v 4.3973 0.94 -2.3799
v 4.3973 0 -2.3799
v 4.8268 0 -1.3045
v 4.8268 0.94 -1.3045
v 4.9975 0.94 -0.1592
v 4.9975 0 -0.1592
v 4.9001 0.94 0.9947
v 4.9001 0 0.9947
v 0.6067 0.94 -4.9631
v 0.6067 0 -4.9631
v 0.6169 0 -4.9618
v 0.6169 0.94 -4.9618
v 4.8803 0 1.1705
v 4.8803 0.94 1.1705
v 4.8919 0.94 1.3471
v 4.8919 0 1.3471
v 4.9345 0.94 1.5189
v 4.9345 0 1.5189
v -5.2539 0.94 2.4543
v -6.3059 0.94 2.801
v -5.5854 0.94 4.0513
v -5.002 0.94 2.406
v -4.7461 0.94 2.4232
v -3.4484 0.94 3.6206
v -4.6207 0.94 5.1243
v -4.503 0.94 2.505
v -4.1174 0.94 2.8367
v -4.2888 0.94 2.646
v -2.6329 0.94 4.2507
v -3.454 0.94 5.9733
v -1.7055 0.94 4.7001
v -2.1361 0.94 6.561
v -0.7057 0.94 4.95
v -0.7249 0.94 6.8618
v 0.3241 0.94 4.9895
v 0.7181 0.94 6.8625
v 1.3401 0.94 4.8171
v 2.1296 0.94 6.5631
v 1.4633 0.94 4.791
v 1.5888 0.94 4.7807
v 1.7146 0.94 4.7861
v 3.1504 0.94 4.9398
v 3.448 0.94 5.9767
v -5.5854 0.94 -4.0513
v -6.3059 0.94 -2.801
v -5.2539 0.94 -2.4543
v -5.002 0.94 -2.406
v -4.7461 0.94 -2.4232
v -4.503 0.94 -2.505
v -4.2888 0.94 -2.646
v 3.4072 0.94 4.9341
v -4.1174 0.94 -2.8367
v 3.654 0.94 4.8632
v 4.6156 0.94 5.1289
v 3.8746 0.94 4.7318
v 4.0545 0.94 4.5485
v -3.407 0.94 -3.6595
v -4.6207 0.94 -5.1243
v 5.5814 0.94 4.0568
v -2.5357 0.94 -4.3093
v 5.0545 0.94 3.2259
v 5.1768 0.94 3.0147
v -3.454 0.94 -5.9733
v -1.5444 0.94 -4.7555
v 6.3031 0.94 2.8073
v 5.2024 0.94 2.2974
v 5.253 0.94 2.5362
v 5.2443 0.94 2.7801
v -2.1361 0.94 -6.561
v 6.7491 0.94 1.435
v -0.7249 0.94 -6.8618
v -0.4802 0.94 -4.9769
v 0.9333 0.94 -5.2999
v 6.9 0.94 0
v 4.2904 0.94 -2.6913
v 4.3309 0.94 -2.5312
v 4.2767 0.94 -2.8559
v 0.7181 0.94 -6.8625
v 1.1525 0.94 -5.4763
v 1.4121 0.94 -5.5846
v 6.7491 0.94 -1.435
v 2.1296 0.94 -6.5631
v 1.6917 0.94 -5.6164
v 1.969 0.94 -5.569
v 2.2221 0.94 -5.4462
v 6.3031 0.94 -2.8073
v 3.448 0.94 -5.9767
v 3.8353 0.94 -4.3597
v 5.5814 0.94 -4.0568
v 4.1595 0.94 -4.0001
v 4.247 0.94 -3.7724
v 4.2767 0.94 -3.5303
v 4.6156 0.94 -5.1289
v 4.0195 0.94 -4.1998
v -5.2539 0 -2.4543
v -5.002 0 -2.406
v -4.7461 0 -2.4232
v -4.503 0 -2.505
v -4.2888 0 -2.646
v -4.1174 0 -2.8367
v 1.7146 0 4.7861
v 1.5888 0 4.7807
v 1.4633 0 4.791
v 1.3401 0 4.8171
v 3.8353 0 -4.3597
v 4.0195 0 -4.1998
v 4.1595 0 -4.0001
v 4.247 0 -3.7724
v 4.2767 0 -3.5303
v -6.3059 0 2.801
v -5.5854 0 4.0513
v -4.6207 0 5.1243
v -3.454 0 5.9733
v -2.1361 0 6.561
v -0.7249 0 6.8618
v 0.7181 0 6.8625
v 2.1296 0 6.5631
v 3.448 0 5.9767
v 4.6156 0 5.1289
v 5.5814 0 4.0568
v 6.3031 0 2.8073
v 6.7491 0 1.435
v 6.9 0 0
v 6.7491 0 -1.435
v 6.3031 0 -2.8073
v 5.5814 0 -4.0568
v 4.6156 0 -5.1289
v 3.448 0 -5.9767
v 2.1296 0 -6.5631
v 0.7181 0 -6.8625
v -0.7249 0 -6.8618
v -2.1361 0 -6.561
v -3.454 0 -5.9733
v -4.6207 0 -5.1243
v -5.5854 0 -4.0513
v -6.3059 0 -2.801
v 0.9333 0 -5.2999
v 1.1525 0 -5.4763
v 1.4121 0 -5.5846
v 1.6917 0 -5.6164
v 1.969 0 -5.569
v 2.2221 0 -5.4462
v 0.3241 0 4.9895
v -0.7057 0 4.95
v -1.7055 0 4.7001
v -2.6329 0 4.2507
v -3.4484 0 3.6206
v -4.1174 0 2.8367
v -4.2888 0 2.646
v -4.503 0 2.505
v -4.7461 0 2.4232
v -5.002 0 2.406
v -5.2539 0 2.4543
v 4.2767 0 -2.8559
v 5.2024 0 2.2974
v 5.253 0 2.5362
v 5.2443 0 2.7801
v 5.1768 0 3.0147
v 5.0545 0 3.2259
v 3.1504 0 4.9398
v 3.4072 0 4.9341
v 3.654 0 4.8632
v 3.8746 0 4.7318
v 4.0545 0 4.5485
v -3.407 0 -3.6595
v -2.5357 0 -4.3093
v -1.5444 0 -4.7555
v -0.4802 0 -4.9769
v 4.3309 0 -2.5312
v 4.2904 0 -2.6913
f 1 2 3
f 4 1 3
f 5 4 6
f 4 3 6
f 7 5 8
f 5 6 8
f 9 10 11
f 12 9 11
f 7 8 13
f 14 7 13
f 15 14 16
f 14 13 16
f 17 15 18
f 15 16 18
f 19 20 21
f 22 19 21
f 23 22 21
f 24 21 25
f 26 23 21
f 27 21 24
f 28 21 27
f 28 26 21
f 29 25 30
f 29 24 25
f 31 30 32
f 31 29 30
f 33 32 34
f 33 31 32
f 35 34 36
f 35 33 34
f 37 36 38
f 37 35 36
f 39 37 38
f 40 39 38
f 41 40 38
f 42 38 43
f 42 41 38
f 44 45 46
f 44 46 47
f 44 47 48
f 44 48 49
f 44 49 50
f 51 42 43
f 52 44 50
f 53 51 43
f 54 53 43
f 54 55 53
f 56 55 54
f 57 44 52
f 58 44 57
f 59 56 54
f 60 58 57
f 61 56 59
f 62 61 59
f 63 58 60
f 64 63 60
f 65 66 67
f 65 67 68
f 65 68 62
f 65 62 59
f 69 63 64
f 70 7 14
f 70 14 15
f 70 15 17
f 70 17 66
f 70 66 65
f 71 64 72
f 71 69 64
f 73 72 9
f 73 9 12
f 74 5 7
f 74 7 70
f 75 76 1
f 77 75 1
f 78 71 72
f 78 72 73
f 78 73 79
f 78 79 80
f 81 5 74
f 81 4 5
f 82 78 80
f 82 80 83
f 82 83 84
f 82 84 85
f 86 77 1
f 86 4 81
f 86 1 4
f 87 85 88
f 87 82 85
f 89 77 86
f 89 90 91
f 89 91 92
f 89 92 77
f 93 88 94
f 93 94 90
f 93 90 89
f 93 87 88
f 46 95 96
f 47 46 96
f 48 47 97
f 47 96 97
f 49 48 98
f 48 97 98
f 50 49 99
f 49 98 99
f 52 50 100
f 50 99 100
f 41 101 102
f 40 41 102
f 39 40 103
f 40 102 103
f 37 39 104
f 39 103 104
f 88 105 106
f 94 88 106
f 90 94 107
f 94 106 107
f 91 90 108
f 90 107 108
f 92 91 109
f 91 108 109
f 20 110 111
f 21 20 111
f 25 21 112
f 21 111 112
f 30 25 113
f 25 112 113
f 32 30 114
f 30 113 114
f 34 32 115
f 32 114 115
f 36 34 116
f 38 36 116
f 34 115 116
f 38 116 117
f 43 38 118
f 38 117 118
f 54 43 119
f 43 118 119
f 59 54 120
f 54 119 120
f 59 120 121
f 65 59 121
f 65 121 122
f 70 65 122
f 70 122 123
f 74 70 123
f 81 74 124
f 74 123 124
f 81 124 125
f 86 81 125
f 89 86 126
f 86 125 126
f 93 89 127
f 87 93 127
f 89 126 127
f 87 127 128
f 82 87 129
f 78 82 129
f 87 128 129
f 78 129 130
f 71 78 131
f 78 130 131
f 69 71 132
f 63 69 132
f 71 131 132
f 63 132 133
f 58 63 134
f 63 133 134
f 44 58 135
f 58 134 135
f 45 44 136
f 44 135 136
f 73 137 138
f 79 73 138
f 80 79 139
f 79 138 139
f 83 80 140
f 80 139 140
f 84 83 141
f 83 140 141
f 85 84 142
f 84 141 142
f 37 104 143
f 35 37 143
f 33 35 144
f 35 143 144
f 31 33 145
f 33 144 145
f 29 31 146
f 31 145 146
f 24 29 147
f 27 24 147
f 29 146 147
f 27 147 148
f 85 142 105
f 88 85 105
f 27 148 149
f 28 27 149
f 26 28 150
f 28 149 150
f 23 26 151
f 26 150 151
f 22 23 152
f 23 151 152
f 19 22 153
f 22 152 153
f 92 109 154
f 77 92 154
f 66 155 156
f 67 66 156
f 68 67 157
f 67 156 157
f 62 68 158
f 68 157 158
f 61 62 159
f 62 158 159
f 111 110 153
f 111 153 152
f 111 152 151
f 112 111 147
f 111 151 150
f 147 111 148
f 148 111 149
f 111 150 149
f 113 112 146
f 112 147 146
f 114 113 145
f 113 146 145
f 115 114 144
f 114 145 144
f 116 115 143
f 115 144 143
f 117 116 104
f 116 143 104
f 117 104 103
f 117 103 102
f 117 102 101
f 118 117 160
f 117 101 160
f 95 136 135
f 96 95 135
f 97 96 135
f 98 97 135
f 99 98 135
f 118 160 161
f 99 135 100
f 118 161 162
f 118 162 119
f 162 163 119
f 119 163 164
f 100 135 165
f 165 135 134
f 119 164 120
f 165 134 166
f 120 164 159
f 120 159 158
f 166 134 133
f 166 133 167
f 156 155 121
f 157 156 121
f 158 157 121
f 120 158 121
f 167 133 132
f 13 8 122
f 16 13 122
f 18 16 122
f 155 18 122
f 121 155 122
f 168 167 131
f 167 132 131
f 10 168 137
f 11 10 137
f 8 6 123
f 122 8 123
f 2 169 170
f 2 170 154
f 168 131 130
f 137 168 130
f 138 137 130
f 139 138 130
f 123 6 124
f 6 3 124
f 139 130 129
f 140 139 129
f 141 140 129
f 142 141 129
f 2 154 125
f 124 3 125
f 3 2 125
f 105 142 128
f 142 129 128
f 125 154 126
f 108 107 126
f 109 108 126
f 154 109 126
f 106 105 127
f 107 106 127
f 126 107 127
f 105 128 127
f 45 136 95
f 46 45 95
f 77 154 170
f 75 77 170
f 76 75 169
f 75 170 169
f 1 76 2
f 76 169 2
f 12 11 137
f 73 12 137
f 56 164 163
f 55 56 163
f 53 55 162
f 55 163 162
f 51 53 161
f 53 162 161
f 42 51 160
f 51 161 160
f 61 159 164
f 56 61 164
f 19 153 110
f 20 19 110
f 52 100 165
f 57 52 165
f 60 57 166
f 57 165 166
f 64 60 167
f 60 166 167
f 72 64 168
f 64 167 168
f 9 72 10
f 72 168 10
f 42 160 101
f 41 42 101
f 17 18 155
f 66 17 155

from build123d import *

# Parameters (mm, degrees)
BOSS_EXTRUDE1_DEPTH = 0.94


with BuildPart() as part:
    # Sketch1 → Boss-Extrude1 (new body)
    with BuildSketch(Plane(origin=(0, 0, 0), x_dir=(1, 0, 0), z_dir=(0, 1, 0))):
        with BuildLine():
            Line((-5.253863679, -2.454338371), (-6.305884625, -2.801038932))
            ThreePointArc((-6.305884625, -2.801038932), (6.9, 0), (-6.305884625, 2.801038932))
            Line((-6.305884625, 2.801038932), (-5.253863679, 2.454338371))
            ThreePointArc((-5.253863679, 2.454338371), (-4.621952363, 2.45630843), (-4.117388267, 2.83674353))
            ThreePointArc((-4.117388267, 2.83674353), (-2.052207562, 4.559434627), (0.606687952, 4.963056491))
            Line((0.606687952, 4.963056491), (0.616921004, 4.961794884))
            Line((0.616921004, 4.961794884), (0.933263365, 5.299935719))
            ThreePointArc((0.933263365, 5.299935719), (1.550759285, 5.61038152), (2.222116774, 5.446195866))
            Line((2.222116774, 5.446195866), (3.835339689, 4.359739617))
            ThreePointArc((3.835339689, 4.359739617), (4.159519117, 4.000089674), (4.276739309, 3.53030269))
            Line((4.276739309, 3.53030269), (4.276739309, 2.855875044))
            ThreePointArc((4.276739309, 2.855875044), (4.307343479, 2.610372041), (4.397282758, 2.37989587))
            ThreePointArc((4.397282758, 2.37989587), (4.945409591, 0.736833755), (4.900068255, -0.994651244))
            ThreePointArc((4.900068255, -0.994651244), (4.882230643, -1.259101387), (4.934494135, -1.518948622))
            Line((4.934494135, -1.518948622), (5.202364417, -2.297438027))
            ThreePointArc((5.202364417, -2.297438027), (5.244325234, -2.78011945), (5.054466855, -3.22587259))
            Line((5.054466855, -3.22587259), (4.054517147, -4.548527481))
            ThreePointArc((4.054517147, -4.548527481), (3.653996144, -4.863205448), (3.150433841, -4.939784193))
            Line((3.150433841, -4.939784193), (1.714554284, -4.786144484))
            ThreePointArc((1.714554284, -4.786144484), (1.525879552, -4.783859514), (1.340134323, -4.817057193))
            ThreePointArc((1.340134323, -4.817057193), (-1.705489788, -4.700138783), (-4.117388267, -2.83674353))
            ThreePointArc((-4.117388267, -2.83674353), (-4.621952363, -2.45630843), (-5.253863679, -2.454338371))
        make_face()
    extrude(amount=BOSS_EXTRUDE1_DEPTH)


solid = part.part
